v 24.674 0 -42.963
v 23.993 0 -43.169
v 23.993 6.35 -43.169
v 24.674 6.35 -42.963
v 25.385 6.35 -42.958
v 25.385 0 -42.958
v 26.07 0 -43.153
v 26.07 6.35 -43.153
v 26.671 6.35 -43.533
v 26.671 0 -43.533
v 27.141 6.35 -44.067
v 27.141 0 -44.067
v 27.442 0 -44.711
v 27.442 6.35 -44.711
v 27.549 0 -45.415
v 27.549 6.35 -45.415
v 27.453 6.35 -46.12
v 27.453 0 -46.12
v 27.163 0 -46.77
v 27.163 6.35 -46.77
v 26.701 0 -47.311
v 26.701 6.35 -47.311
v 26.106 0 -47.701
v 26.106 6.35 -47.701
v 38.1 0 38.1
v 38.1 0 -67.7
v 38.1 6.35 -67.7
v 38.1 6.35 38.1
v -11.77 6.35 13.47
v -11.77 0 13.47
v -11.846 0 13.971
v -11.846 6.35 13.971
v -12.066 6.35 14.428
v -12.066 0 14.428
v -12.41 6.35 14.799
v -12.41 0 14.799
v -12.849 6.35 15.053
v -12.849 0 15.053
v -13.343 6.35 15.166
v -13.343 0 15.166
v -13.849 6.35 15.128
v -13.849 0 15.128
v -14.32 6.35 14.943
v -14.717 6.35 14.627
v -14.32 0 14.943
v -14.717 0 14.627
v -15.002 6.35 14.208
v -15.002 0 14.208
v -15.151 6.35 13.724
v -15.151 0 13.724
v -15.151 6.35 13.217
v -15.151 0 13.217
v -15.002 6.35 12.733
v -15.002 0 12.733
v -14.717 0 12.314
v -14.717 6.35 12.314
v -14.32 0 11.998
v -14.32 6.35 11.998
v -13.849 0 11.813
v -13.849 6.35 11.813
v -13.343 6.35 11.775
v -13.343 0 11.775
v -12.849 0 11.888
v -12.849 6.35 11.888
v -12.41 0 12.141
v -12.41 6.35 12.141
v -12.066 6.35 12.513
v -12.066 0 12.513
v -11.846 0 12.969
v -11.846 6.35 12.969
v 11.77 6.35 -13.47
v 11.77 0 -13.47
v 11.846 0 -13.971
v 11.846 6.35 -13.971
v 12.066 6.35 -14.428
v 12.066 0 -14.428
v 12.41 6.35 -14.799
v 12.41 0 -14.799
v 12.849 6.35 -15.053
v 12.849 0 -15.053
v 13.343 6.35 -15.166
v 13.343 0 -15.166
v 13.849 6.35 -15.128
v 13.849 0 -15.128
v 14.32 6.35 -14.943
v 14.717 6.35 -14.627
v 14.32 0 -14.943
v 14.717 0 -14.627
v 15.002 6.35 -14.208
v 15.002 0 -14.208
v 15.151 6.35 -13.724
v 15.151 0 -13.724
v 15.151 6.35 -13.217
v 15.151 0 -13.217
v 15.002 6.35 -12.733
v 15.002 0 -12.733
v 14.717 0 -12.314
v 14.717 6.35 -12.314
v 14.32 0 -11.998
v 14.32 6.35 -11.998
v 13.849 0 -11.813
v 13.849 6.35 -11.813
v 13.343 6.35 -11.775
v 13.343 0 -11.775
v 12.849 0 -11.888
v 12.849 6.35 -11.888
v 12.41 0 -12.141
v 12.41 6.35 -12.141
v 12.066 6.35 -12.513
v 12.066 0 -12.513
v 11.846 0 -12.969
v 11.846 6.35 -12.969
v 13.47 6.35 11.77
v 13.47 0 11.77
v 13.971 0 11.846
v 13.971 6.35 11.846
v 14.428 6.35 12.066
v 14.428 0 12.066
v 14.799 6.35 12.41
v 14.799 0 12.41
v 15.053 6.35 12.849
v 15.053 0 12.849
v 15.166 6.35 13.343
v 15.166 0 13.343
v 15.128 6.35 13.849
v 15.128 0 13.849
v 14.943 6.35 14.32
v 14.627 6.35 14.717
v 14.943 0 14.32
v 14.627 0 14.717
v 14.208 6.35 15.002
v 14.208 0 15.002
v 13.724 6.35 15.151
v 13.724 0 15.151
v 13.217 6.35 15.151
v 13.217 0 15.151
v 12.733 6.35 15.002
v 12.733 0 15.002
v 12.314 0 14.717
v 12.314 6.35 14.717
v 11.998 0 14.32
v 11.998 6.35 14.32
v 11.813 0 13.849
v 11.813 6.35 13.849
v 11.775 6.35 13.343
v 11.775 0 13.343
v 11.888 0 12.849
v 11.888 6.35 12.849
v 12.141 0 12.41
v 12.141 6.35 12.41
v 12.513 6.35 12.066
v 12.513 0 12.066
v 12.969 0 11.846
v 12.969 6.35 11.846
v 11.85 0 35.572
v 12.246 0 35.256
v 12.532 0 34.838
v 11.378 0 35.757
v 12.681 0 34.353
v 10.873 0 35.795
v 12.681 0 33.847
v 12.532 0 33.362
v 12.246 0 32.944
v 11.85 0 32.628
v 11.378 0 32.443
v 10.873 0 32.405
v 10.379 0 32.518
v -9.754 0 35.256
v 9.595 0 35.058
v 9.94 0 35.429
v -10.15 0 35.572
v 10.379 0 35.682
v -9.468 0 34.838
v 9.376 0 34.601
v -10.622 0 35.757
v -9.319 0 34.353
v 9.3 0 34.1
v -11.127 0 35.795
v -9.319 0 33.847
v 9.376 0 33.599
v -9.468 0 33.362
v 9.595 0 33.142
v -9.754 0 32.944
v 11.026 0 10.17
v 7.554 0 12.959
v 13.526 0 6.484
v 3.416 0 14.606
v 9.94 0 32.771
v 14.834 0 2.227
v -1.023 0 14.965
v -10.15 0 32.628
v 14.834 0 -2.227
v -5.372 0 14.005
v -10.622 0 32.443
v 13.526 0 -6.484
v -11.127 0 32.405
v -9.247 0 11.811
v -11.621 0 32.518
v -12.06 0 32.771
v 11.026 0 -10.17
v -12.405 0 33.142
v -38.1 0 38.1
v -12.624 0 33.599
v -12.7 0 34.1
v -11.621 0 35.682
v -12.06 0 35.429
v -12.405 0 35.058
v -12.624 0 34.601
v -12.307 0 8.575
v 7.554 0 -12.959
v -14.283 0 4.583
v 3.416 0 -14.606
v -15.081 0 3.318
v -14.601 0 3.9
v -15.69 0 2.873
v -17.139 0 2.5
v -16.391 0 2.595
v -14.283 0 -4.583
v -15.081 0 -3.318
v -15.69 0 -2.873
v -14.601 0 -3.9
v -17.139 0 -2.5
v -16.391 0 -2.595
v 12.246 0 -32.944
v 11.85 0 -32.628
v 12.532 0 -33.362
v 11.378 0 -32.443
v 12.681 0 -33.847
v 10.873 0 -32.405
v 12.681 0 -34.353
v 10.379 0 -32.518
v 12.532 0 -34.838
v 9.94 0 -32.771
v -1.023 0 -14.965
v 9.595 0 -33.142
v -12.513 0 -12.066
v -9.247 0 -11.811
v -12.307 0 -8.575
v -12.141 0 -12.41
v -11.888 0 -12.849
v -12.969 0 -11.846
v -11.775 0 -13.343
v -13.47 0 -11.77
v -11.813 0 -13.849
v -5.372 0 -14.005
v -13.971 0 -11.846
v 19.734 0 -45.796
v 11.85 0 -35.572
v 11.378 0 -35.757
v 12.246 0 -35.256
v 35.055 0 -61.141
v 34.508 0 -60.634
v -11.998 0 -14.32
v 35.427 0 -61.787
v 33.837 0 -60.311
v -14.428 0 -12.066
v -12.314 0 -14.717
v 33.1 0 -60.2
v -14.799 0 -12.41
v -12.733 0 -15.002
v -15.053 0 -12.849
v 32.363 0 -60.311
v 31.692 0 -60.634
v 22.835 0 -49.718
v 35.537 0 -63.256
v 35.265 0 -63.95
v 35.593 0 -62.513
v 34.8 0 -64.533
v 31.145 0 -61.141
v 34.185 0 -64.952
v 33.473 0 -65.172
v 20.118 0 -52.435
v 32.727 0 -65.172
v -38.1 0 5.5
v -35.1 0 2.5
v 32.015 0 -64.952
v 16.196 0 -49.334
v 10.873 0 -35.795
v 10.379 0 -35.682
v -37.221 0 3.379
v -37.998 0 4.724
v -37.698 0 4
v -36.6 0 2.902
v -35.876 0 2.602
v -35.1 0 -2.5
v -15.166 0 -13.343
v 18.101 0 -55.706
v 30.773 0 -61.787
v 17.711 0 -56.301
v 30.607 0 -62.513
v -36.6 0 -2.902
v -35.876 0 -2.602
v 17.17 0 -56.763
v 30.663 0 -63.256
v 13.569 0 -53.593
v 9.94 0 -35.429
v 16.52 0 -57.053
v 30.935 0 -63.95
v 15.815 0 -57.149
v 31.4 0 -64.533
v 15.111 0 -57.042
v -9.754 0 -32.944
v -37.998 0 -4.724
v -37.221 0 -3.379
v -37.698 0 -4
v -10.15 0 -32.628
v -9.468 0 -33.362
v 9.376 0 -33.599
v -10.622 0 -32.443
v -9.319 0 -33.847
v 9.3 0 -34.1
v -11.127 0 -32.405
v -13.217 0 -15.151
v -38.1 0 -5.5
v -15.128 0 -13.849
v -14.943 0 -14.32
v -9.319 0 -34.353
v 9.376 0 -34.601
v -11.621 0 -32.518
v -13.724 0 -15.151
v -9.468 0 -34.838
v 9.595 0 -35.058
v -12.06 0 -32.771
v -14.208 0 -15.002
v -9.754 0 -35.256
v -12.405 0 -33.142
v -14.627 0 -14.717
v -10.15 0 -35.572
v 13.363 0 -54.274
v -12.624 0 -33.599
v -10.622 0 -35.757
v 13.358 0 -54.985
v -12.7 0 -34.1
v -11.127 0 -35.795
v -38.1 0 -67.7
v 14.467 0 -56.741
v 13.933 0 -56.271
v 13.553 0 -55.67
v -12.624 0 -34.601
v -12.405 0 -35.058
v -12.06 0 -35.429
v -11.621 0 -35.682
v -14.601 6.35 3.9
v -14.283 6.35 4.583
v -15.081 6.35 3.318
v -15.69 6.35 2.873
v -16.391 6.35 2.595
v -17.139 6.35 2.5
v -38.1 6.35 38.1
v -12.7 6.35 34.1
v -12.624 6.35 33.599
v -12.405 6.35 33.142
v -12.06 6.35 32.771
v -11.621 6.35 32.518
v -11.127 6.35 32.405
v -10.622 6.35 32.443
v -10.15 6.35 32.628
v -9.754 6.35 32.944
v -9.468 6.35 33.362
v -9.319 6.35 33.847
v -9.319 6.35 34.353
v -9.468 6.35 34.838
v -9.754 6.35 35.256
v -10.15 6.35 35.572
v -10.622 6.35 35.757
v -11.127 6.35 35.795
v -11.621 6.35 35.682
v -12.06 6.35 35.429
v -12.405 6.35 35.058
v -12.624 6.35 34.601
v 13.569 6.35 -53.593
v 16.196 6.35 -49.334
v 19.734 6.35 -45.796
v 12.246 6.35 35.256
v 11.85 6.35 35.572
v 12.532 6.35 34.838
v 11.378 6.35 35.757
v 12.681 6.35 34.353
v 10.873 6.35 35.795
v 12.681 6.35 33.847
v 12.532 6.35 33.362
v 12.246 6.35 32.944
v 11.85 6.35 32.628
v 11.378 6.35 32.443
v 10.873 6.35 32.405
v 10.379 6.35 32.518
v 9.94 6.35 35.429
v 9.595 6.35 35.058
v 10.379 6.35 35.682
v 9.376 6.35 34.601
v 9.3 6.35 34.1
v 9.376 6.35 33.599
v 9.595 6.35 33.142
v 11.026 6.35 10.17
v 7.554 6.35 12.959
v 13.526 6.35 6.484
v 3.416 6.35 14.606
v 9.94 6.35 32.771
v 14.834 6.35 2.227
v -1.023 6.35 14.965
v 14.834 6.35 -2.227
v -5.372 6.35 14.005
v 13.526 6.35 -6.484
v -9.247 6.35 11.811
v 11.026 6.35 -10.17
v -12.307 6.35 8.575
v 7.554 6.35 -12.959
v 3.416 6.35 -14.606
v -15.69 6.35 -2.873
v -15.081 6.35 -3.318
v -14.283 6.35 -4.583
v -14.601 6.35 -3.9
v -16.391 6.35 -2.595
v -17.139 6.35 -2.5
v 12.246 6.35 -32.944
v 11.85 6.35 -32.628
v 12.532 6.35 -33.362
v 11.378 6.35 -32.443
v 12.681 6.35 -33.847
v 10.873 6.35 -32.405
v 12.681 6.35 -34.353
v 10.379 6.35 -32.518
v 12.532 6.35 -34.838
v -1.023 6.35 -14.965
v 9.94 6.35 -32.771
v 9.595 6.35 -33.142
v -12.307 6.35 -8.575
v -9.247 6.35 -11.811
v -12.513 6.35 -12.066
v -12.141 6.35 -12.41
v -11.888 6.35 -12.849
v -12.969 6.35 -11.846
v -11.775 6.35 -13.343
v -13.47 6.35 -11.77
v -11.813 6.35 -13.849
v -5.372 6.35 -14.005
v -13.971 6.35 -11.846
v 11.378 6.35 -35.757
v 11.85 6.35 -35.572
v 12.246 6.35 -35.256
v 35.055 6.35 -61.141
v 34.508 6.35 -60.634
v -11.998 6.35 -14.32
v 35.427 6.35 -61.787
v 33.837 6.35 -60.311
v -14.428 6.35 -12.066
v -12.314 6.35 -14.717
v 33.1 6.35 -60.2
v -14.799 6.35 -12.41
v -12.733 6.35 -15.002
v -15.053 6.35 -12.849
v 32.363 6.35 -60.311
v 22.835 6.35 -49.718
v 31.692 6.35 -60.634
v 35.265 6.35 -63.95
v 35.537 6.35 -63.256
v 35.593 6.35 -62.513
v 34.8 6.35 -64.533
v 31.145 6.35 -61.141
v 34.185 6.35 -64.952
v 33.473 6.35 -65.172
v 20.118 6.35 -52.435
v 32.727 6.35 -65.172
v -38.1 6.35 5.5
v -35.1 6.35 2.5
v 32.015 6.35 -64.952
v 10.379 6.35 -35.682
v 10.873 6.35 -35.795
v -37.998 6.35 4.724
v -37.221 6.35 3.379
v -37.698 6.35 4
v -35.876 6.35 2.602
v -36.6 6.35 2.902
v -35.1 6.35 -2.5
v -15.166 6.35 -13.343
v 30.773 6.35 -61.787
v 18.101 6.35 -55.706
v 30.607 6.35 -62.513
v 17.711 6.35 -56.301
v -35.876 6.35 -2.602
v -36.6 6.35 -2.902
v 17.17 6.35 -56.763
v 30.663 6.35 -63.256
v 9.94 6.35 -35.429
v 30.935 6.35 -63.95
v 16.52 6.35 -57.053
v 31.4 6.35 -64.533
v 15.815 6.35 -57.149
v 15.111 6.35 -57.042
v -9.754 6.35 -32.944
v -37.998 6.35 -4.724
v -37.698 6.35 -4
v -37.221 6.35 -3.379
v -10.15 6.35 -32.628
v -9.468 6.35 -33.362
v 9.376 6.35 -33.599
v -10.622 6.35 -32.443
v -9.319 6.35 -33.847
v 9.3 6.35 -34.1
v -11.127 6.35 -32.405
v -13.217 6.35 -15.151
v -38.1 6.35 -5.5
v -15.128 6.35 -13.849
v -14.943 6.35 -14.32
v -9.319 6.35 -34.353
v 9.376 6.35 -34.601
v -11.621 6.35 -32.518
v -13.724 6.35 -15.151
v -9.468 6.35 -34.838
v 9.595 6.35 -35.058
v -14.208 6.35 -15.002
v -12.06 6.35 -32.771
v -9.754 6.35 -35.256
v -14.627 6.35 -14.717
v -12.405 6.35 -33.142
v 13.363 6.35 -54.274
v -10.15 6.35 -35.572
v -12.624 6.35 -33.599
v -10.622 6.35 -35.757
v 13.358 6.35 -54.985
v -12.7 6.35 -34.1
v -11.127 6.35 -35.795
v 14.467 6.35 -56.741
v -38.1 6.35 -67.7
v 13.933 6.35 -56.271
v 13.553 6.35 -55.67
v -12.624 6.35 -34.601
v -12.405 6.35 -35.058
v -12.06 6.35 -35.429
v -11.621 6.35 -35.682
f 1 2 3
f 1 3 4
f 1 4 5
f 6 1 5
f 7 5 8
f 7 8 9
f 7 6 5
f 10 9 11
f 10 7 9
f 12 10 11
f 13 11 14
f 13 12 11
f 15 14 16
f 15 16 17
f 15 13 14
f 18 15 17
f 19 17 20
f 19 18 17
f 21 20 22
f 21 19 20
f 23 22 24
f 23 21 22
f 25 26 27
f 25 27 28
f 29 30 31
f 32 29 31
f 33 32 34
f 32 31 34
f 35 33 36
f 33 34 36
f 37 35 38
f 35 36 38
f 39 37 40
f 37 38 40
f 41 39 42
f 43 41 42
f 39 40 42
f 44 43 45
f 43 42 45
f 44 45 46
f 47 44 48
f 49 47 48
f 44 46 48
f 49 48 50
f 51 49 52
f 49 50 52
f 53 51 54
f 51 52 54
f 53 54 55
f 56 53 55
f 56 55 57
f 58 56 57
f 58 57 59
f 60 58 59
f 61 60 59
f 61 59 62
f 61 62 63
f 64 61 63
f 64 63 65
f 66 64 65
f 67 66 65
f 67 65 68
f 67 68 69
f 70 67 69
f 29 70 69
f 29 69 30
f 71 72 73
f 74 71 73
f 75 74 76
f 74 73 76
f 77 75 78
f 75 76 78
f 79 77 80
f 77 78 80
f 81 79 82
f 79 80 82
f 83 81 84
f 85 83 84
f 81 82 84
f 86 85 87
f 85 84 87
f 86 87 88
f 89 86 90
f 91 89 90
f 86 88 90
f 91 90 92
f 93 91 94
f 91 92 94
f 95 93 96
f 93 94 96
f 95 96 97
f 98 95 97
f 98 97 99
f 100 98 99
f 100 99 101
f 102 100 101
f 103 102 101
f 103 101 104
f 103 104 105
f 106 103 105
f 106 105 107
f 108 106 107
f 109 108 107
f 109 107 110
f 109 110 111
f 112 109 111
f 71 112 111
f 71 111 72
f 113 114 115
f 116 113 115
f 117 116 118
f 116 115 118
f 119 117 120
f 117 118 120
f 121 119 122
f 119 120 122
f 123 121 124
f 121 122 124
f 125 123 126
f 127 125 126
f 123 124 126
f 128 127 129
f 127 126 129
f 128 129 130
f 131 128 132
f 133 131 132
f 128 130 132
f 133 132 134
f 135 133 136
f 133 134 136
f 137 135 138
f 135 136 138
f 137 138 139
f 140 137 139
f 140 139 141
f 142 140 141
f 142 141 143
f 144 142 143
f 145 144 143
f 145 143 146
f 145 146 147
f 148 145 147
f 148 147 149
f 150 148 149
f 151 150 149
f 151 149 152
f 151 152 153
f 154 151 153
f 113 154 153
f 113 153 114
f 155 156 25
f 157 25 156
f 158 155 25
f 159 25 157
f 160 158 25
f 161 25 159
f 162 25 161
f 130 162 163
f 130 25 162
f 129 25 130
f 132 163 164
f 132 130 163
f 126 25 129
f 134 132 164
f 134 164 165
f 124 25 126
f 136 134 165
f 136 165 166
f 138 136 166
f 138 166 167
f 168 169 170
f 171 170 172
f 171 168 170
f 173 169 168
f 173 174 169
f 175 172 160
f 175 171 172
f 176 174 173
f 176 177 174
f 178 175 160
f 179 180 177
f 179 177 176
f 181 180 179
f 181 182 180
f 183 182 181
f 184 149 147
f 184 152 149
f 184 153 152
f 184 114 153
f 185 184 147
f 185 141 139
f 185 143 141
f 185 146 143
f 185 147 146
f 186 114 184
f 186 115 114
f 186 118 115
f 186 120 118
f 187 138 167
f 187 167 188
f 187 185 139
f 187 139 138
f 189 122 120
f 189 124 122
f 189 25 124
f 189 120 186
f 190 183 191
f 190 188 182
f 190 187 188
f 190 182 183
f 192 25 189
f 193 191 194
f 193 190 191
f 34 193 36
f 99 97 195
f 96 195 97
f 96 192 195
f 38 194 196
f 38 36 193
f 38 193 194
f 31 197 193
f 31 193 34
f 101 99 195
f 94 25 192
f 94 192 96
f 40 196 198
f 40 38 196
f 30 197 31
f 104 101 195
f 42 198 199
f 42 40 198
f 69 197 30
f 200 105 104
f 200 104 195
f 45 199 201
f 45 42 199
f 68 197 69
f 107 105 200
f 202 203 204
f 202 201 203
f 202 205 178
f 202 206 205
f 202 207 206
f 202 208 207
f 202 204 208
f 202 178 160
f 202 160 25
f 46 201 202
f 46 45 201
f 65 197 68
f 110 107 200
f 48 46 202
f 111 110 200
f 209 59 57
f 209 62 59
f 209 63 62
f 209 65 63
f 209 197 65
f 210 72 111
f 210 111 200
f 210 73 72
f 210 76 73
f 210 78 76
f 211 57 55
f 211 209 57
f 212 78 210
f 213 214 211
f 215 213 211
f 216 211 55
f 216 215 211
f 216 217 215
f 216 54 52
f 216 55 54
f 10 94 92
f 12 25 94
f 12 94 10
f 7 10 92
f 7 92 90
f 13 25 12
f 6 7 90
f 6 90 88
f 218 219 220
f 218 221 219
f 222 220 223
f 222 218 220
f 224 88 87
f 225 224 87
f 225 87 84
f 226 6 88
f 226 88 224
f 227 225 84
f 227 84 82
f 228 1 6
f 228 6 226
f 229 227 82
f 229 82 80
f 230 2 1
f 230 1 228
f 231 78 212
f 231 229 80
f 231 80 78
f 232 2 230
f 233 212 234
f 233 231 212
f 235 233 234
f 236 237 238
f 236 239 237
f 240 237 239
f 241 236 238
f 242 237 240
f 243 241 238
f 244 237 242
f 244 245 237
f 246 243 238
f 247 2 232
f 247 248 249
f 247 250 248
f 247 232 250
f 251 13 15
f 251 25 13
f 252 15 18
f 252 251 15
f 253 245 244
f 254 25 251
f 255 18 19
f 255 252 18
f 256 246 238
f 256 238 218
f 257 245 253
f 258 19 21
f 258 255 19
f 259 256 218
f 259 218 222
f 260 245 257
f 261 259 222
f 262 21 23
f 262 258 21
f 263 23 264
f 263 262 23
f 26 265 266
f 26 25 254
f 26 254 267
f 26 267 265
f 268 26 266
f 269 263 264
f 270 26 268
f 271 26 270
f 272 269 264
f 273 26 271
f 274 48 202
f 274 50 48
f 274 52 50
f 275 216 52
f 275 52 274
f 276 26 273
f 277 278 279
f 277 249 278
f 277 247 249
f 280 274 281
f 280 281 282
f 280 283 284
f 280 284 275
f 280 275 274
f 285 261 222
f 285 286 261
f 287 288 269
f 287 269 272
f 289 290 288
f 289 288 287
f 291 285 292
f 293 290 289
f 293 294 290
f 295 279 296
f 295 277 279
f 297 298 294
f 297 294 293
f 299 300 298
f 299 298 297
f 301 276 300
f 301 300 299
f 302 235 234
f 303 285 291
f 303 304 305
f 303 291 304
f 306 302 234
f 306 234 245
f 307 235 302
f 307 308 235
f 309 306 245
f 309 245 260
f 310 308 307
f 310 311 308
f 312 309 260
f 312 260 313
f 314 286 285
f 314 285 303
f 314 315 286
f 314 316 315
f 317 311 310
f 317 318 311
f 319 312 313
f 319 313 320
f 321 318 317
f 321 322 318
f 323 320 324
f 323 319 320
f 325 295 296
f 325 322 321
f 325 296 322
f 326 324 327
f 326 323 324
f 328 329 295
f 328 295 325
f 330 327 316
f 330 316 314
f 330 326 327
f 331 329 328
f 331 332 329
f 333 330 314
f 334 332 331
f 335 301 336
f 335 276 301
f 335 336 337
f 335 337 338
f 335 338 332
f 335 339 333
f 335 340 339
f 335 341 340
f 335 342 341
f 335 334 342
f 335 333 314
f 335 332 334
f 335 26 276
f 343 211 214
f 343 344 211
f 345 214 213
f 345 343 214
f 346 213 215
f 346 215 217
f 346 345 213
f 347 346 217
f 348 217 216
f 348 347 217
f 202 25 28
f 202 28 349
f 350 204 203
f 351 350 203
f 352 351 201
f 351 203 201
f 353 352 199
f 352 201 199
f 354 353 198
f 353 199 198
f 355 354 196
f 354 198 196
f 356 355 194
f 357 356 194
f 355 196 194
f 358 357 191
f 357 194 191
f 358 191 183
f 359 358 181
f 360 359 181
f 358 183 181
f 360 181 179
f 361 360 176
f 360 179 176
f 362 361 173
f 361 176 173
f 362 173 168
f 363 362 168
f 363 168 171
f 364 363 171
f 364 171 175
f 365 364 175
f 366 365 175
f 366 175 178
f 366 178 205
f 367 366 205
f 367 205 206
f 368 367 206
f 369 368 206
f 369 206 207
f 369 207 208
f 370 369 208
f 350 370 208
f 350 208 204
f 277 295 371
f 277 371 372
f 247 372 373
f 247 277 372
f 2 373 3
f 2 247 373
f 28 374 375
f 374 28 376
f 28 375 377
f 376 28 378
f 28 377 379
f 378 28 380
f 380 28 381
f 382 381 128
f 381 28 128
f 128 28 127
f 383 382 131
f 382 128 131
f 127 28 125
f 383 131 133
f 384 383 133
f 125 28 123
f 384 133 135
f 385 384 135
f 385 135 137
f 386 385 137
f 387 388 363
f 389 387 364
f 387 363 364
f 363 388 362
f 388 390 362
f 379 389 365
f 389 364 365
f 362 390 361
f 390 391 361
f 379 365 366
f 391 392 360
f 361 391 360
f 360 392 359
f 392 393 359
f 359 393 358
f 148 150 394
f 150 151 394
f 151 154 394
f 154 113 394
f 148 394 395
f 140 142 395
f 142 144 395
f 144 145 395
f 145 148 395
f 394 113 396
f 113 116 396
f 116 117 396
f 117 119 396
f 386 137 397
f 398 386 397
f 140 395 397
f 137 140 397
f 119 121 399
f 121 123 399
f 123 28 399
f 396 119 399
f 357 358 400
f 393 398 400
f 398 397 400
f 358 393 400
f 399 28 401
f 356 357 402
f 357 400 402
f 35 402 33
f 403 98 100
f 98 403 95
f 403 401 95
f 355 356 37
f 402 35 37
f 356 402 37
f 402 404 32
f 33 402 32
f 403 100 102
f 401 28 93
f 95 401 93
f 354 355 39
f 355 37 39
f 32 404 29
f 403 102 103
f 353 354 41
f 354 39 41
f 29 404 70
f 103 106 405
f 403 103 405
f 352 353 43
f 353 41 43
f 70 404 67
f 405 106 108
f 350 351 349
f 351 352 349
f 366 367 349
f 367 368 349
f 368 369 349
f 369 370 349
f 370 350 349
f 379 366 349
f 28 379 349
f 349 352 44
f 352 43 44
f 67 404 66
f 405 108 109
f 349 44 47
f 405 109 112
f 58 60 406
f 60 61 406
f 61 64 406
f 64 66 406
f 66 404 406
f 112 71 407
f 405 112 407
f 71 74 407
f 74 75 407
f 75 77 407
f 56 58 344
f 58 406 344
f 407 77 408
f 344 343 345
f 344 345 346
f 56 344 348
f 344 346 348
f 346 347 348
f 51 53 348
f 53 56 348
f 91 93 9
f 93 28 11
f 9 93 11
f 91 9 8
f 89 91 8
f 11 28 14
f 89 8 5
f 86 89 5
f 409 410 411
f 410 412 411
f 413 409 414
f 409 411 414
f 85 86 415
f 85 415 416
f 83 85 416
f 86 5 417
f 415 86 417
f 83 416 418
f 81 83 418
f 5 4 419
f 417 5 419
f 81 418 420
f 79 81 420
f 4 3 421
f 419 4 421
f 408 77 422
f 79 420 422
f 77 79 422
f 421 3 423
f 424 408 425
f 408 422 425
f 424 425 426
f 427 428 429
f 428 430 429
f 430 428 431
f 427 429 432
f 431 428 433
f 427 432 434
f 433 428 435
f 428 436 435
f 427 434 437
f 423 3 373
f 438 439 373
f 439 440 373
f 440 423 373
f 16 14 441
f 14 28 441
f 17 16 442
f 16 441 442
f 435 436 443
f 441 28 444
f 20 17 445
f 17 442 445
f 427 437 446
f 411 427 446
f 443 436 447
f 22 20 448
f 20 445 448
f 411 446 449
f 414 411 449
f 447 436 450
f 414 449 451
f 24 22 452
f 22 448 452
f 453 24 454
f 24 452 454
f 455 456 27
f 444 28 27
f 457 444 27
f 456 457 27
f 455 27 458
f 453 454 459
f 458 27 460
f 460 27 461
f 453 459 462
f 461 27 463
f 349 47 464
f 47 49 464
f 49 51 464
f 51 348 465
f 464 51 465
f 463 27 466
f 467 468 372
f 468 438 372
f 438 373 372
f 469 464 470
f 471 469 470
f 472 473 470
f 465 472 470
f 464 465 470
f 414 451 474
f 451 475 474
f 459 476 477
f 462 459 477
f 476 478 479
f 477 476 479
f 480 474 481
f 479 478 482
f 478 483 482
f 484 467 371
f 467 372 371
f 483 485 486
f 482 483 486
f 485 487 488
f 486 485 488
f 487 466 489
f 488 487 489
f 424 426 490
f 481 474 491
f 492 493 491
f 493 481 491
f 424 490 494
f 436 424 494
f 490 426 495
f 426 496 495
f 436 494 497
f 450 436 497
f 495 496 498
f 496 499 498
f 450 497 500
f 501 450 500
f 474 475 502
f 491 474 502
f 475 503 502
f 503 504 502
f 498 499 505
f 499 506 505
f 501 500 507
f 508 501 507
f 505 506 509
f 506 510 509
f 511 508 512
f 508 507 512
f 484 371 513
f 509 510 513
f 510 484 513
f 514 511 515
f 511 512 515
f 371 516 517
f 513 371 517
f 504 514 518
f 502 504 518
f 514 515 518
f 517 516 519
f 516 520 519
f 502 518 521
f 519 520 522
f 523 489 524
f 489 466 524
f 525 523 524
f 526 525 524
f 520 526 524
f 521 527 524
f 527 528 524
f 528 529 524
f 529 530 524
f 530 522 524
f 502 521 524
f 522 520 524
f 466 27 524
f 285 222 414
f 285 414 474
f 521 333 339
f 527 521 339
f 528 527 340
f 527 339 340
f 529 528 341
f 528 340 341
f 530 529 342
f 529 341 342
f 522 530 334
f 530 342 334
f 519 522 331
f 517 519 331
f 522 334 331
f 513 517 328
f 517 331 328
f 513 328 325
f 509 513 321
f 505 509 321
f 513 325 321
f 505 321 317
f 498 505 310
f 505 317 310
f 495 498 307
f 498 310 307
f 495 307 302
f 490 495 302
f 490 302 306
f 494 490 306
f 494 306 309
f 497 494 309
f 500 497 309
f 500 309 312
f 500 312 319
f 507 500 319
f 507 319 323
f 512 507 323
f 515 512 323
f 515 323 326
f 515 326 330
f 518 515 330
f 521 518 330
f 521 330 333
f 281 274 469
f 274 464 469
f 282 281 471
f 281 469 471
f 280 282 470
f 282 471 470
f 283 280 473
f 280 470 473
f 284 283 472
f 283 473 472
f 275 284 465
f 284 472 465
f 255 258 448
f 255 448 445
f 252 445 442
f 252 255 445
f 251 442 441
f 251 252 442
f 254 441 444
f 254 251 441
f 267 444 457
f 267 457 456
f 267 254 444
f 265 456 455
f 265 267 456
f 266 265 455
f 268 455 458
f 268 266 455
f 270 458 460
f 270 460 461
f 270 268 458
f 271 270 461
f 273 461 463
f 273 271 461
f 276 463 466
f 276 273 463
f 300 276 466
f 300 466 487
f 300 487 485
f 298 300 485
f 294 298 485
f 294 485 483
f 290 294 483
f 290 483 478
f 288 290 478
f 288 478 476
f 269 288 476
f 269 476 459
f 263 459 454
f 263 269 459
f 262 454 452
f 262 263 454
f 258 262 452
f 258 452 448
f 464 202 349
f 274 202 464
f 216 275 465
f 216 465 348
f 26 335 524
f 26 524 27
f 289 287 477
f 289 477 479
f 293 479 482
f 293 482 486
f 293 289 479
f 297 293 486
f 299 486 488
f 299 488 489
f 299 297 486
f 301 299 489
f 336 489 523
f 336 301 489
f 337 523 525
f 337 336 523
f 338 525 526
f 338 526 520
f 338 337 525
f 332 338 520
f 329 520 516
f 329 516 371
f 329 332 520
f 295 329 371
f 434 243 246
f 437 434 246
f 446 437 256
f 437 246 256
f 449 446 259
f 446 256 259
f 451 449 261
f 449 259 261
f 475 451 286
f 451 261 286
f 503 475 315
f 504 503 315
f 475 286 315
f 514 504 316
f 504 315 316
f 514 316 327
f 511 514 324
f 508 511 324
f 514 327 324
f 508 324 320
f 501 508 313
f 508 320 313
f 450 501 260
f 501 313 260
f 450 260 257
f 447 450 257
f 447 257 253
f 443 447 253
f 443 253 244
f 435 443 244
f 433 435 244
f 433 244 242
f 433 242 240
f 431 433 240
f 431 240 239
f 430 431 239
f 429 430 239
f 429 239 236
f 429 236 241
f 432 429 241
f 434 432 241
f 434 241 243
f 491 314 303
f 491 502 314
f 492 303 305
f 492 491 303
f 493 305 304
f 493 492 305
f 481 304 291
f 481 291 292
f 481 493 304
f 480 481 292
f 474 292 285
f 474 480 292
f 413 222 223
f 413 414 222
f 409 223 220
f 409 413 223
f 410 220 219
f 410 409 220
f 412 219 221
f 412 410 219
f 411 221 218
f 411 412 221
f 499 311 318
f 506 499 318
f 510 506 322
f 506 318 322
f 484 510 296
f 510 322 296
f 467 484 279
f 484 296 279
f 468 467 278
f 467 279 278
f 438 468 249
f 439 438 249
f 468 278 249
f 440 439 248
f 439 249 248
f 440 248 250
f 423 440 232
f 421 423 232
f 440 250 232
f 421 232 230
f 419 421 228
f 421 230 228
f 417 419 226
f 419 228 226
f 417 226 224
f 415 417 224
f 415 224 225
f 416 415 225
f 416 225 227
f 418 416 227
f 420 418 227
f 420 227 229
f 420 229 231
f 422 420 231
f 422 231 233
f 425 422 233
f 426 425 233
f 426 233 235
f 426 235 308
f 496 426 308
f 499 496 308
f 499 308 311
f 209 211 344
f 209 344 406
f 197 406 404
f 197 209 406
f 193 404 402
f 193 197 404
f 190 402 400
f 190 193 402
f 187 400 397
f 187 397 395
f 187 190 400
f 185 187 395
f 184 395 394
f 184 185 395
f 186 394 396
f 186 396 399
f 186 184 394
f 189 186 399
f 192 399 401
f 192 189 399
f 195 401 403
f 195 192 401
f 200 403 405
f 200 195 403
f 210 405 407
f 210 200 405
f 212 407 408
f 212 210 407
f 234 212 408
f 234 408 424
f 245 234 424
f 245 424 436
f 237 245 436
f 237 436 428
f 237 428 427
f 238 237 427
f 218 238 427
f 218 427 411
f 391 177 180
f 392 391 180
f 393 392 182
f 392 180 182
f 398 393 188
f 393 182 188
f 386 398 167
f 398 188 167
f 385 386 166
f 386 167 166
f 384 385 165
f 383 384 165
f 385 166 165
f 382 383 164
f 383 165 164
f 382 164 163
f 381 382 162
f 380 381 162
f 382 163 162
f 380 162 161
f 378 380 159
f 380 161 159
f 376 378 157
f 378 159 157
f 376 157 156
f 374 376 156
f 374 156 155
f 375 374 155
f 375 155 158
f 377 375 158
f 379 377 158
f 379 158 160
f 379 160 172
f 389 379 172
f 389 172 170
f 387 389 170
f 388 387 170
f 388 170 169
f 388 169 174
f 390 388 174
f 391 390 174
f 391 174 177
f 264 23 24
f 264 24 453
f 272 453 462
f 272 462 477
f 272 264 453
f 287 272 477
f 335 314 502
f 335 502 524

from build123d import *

# Parameters (mm, degrees)
SKETCH1_R            = 2.5
BOSS_EXTRUDE1_DEPTH  = 6.35
M3_CLEARANCE_HOLE1_D = 3.4
CIRPATTERN1_COUNT    = 4
M3_CLEARANCE_HOLE3_D = 3.4
FILLET1_R            = 3


with BuildPart() as part:
    # Sketch1 → Boss-Extrude1 (new body)
    with BuildSketch(Plane(origin=(0, 0, 0), x_dir=(1, 0, 0), z_dir=(0, 1, 0))):
        with BuildLine():
            Line((-38.1, 67.7), (38.1, 67.7))
            Line((38.1, 67.7), (38.1, -38.1))
            Line((38.1, -38.1), (-38.1, -38.1))
            Line((-38.1, -38.1), (-38.1, -2.5))
            Line((-38.1, -2.5), (-14.790199458, -2.5))
            ThreePointArc((-14.790199458, -2.5), (15, 0), (-14.790199458, 2.5))
            Line((-14.790199458, 2.5), (-38.1, 2.5))
            Line((-38.1, 2.5), (-38.1, 67.7))
        make_face()
        with Locations(Location((33.1, 62.7, 0), (0, 0, 270))):
            Circle(SKETCH1_R, mode=Mode.SUBTRACT)
        with BuildLine():
            ThreePointArc((26.105667768, 47.700606125), (21.397382771, 50.997382771), (18.100606125, 55.705667768))
            ThreePointArc((18.100606125, 55.705667768), (14.778291003, 56.914891581), (13.569067189, 53.592576459))
            ThreePointArc((13.569067189, 53.592576459), (17.861848865, 47.461848865), (23.992576459, 43.169067189))
            ThreePointArc((23.992576459, 43.169067189), (27.314891581, 44.378291003), (26.105667768, 47.700606125))
        make_face(mode=Mode.SUBTRACT)
    extrude(amount=BOSS_EXTRUDE1_DEPTH)

    # M3 Clearance Hole1 (through all)
    with Locations(Plane(origin=(0, 6.35, 0), x_dir=(1, 0, 0), z_dir=(0, 1, 0))):
        with Locations((13.470384182, 13.470384182)):
            m3_clearance_hole1 = Hole(M3_CLEARANCE_HOLE1_D / 2)

    # CirPattern1: M3 Clearance Hole1 ×4 about axis
    cirpattern1_axis = Axis((0, 0, 0), (0, 1, 0))
    for i in range(1, CIRPATTERN1_COUNT):
        add(m3_clearance_hole1.rotate(cirpattern1_axis, i * 360 / CIRPATTERN1_COUNT), mode=Mode.SUBTRACT)

    # M3 Clearance Hole3 (through all)
    with Locations(Plane(origin=(0, 6.35, 0), x_dir=(1, 0, 0), z_dir=(0, 1, 0))):
        with Locations((11, 34.1), (-11, -34.1), (11, -34.1), (-11, 34.1)):
            Hole(M3_CLEARANCE_HOLE3_D / 2)

    # Fillet1
    fillet1_edges = [part.edges().sort_by_distance(p)[0] for p in [
        (-14.790199458, 3.175, -2.5),
        (-38.1, 3.175, -2.5),
        (-38.1, 3.175, 2.5),
        (-14.790199458, 3.175, 2.5),
    ]]
    fillet(fillet1_edges, radius=FILLET1_R)


solid = part.part
